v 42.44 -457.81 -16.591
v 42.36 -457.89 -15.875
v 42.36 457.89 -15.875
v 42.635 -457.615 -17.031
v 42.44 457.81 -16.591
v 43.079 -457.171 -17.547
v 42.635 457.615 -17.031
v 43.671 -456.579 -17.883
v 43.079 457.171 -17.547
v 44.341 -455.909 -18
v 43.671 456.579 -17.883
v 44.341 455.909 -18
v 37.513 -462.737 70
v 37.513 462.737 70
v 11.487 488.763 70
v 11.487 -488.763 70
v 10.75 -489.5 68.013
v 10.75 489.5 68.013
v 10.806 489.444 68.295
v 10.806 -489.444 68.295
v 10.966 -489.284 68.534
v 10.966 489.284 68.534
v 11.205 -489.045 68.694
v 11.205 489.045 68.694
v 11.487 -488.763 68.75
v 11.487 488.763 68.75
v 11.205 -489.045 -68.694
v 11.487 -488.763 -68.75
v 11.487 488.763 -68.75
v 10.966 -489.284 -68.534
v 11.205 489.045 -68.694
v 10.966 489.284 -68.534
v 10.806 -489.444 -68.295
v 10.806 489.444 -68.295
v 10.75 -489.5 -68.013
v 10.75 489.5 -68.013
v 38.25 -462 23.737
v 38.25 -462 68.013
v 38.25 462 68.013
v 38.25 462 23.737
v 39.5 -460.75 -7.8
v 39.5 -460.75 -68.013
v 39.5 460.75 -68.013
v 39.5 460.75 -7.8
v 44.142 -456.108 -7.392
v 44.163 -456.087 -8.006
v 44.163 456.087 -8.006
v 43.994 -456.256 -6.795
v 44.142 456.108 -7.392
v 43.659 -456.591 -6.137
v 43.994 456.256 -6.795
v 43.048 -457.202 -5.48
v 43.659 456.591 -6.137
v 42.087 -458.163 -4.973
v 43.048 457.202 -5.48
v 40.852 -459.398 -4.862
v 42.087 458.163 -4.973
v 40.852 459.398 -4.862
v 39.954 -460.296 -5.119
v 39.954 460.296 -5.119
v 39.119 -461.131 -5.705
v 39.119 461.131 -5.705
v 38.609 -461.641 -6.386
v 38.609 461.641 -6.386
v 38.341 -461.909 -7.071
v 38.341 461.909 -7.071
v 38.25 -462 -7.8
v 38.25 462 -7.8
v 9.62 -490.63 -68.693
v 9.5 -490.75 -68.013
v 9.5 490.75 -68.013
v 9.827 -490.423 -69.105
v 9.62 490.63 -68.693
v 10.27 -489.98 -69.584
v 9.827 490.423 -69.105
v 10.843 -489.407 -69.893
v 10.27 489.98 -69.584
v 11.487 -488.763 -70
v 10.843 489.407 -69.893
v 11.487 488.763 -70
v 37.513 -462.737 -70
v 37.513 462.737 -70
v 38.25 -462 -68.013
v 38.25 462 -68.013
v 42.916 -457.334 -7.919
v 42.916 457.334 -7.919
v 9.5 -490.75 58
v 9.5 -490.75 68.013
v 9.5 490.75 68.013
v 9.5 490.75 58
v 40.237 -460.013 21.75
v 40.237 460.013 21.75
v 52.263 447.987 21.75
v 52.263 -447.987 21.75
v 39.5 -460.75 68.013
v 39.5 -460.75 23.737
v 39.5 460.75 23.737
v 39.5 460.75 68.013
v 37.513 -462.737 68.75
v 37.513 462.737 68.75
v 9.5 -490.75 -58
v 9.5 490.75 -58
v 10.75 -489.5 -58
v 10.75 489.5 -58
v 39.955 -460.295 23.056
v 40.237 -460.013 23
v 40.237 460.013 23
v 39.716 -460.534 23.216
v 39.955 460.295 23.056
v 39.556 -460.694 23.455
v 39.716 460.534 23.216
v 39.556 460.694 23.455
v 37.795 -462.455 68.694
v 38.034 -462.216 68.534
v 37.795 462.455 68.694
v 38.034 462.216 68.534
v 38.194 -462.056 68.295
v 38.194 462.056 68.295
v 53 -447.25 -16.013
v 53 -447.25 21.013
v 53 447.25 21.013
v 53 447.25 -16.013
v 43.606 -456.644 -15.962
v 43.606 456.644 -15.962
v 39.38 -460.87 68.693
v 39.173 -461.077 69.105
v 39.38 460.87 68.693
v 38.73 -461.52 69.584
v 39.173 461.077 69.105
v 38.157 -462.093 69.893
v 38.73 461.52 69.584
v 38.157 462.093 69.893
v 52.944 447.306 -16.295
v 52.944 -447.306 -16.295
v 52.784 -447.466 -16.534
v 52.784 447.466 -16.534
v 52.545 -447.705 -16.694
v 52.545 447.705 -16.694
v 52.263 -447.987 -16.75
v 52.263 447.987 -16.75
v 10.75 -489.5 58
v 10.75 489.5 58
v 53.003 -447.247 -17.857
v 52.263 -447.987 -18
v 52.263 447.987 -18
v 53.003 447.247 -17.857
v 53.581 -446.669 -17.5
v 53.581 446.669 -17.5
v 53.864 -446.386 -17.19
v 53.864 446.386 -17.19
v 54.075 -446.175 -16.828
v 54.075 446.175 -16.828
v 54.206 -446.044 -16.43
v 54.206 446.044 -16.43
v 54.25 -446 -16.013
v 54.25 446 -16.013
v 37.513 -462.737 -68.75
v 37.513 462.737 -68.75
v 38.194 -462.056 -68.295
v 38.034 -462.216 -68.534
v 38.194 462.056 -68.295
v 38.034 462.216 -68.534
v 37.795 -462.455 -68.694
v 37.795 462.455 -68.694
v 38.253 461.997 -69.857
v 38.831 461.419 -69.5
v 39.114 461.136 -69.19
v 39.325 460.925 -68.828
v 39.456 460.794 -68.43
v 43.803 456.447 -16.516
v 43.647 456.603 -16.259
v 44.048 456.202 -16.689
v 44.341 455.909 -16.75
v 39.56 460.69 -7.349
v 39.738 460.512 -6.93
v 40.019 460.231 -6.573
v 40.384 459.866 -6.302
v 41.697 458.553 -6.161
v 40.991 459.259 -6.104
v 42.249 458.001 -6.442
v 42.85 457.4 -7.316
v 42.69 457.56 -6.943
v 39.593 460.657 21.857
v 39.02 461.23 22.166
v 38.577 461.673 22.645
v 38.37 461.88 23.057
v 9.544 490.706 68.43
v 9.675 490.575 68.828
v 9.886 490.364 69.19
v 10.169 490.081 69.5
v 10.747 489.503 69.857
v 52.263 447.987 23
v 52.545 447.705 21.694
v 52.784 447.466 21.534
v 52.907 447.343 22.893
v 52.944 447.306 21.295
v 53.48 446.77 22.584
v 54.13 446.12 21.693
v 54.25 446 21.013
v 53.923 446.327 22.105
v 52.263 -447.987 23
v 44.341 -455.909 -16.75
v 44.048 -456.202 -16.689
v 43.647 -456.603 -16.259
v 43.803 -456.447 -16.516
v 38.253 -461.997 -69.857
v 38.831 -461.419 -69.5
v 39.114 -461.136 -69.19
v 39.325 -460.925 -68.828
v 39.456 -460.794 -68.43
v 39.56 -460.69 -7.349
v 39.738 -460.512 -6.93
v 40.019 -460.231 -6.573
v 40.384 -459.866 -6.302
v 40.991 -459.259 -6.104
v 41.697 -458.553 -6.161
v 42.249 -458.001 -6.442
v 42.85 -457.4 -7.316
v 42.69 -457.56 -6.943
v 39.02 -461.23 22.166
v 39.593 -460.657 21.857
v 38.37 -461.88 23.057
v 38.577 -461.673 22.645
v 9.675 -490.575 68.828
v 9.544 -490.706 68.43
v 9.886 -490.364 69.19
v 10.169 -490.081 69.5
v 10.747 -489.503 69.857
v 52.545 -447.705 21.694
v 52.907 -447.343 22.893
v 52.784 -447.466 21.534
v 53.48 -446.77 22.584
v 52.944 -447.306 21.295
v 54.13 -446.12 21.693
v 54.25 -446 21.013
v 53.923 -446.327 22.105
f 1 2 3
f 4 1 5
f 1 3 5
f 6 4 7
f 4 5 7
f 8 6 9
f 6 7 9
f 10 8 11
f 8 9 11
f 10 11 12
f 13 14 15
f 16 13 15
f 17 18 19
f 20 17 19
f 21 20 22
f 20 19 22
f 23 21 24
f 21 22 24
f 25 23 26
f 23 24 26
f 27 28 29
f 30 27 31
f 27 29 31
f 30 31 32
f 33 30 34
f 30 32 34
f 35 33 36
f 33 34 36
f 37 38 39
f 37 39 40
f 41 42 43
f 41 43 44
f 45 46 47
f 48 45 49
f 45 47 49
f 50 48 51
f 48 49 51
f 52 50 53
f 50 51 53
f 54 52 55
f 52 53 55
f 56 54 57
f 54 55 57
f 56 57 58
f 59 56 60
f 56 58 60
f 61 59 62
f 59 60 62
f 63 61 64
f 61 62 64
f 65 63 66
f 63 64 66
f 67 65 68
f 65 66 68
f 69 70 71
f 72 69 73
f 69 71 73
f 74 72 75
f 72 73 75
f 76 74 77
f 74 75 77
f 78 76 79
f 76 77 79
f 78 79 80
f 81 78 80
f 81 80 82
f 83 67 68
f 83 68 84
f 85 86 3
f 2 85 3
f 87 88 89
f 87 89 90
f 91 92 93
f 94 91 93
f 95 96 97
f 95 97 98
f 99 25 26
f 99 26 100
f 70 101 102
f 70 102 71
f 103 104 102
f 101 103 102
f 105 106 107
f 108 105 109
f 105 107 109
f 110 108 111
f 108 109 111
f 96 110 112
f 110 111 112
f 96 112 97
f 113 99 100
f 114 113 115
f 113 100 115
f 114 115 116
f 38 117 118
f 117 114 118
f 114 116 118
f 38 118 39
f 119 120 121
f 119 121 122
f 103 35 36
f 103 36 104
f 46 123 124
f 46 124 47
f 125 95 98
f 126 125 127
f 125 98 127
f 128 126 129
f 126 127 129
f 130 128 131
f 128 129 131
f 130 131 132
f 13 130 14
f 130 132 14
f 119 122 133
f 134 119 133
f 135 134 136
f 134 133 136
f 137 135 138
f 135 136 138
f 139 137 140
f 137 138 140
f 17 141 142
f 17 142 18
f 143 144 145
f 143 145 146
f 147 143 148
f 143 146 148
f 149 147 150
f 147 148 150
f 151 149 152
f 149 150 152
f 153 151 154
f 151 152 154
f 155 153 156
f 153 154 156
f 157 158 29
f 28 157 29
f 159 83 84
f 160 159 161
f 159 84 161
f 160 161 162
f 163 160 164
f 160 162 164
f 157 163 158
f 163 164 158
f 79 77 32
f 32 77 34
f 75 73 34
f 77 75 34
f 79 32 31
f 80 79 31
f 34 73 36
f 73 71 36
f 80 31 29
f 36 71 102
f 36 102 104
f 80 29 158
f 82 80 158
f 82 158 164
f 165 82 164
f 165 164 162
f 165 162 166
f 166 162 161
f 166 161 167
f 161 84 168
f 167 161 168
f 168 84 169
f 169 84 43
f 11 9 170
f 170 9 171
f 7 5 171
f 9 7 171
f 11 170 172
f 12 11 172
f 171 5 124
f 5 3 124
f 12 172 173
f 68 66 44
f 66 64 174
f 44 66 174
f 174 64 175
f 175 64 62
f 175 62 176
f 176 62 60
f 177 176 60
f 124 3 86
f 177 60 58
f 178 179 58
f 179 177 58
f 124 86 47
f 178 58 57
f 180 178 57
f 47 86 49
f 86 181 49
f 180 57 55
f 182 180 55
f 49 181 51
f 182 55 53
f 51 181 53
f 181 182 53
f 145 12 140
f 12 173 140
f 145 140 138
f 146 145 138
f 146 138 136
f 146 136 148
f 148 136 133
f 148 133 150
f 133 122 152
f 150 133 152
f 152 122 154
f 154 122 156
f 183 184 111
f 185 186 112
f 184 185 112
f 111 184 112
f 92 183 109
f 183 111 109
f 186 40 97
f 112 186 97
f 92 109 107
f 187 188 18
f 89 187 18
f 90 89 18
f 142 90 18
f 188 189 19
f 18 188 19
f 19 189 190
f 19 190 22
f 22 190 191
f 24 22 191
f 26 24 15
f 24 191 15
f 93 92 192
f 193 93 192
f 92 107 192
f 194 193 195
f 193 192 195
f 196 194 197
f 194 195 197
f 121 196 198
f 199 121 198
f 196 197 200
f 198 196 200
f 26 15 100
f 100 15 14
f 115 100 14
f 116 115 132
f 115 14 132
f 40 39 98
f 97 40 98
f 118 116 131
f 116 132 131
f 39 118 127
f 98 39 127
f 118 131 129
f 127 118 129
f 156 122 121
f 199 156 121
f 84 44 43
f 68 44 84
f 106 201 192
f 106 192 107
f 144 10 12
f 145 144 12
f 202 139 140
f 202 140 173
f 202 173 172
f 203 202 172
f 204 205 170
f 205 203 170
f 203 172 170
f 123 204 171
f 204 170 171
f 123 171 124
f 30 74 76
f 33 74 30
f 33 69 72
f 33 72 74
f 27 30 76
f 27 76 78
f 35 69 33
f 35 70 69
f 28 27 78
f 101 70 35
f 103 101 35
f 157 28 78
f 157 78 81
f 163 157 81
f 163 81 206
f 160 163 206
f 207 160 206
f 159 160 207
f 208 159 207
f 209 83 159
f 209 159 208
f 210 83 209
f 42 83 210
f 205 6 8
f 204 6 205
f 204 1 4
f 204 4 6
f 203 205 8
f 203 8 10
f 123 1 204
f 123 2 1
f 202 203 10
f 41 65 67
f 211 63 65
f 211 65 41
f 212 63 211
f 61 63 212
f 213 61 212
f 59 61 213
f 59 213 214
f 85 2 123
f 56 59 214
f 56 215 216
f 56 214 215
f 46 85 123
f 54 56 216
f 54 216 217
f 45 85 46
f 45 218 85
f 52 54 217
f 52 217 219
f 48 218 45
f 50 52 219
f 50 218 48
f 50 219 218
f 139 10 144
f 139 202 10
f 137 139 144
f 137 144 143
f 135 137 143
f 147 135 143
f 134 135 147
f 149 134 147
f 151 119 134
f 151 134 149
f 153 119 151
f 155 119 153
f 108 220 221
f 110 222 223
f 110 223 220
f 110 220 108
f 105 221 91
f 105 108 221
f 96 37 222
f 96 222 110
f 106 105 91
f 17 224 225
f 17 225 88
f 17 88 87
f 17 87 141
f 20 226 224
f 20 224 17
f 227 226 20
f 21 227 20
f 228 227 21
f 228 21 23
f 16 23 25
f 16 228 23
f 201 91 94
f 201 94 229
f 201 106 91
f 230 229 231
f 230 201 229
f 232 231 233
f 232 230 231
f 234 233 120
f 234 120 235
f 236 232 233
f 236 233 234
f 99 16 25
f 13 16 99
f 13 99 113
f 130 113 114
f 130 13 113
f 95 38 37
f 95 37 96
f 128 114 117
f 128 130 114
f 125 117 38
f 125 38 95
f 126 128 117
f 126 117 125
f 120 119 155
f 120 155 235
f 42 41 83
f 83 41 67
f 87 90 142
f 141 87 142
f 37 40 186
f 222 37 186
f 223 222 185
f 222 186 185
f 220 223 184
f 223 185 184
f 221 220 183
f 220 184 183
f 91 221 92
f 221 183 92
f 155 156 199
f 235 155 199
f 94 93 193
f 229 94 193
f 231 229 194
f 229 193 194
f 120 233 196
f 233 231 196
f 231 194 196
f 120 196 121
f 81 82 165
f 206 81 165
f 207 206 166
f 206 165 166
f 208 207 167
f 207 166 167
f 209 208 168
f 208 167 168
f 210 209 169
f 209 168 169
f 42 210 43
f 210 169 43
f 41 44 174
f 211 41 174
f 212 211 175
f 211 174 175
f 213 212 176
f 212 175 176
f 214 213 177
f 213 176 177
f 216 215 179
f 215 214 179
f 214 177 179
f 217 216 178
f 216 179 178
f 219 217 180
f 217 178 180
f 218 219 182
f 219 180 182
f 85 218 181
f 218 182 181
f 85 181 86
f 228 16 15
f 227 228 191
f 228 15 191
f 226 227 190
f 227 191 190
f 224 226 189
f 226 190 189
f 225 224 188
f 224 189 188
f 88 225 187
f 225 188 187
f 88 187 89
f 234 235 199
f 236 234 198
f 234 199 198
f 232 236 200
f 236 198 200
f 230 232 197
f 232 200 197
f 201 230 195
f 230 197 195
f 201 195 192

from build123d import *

# Parameters (mm, degrees)
BASE_FLANGE1_DEPTH = 490.75
CUT_EXTRUDE2_DEPTH = 514.204272196


# Sheet-metal steps are written as plain solids
with BuildPart() as part:
    # Sketch1 → Base-Flange1 (new, symmetric)
    with BuildSketch(Plane(origin=(0, 0, 0), x_dir=(1, 0, 0), z_dir=(0, 1, 0))):
        with BuildLine():
            Line((9.5, 58), (9.5, 68.0134))
            ThreePointArc((9.5, 68.0134), (10.081861668, 69.418138332), (11.4866, 70))
            Line((11.4866, 70), (37.5134, 70))
            ThreePointArc((37.5134, 70), (38.918138332, 69.418138332), (39.5, 68.0134))
            Line((39.5, 68.0134), (39.5, 23))
            Line((39.5, 23), (39.5, 18))
            Line((39.5, 18), (39.5, 7.8))
            ThreePointArc((39.5, 7.8), (41.269678139, 6.091041686), (42.915834526, 7.91928357))
            Line((42.915834526, 7.91928357), (42.359529101, 15.874821789))
            ThreePointArc((42.359529101, 15.874821789), (42.88838258, 17.368257942), (44.341289843, 18))
            Line((44.341289843, 18), (52.2634, 18))
            ThreePointArc((52.2634, 18), (53.668138332, 17.418138332), (54.25, 16.0134))
            Line((54.25, 16.0134), (54.25, -21.0134))
            ThreePointArc((54.25, -21.0134), (53.668138332, -22.418138332), (52.2634, -23))
            Line((52.2634, -23), (40.2366, -23))
            ThreePointArc((40.2366, -23), (39.715745145, -23.215745145), (39.5, -23.7366))
            Line((39.5, -23.7366), (39.5, -68.0134))
            ThreePointArc((39.5, -68.0134), (38.918138332, -69.418138332), (37.5134, -70))
            Line((37.5134, -70), (11.4866, -70))
            ThreePointArc((11.4866, -70), (10.081861668, -69.418138332), (9.5, -68.0134))
            Line((9.5, -68.0134), (9.5, -58))
            Line((9.5, -58), (10.75, -58))
            Line((10.75, -58), (10.75, -68.0134))
            ThreePointArc((10.75, -68.0134), (10.965745145, -68.534254855), (11.4866, -68.75))
            Line((11.4866, -68.75), (37.5134, -68.75))
            ThreePointArc((37.5134, -68.75), (38.034254855, -68.534254855), (38.25, -68.0134))
            Line((38.25, -68.0134), (38.25, -23.7366))
            ThreePointArc((38.25, -23.7366), (38.831861668, -22.331861668), (40.2366, -21.75))
            Line((40.2366, -21.75), (52.2634, -21.75))
            ThreePointArc((52.2634, -21.75), (52.784254855, -21.534254855), (53, -21.0134))
            Line((53, -21.0134), (53, 16.0134))
            ThreePointArc((53, 16.0134), (52.784254855, 16.534254855), (52.2634, 16.75))
            Line((52.2634, 16.75), (44.341289843, 16.75))
            ThreePointArc((44.341289843, 16.75), (43.802574707, 16.515759992), (43.606484164, 15.962017381))
            Line((43.606484164, 15.962017381), (44.162789589, 8.006479162))
            ThreePointArc((44.162789589, 8.006479162), (41.31330251, 4.841803152), (38.25, 7.8))
            Line((38.25, 7.8), (38.25, 18))
            Line((38.25, 18), (38.25, 23))
            Line((38.25, 23), (38.25, 68.0134))
            ThreePointArc((38.25, 68.0134), (38.034254855, 68.534254855), (37.5134, 68.75))
            Line((37.5134, 68.75), (11.4866, 68.75))
            ThreePointArc((11.4866, 68.75), (10.965745145, 68.534254855), (10.75, 68.0134))
            Line((10.75, 68.0134), (10.75, 58))
            Line((10.75, 58), (9.5, 58))
        make_face()
    extrude(amount=BASE_FLANGE1_DEPTH, both=True)

    # Sketch2 → Cut-Extrude2 (cut, through all)
    with BuildSketch(Plane.XY.offset(70)):
        Polygon((9.5, -490.75), (246.796446659, -253.453553341), (123.087268974, -490.75), align=None)
        Polygon((123.087268974, 490.75), (9.5, 490.75), (246.796446659, 253.453553341), align=None)
    extrude(amount=-CUT_EXTRUDE2_DEPTH, mode=Mode.SUBTRACT)


solid = part.part
